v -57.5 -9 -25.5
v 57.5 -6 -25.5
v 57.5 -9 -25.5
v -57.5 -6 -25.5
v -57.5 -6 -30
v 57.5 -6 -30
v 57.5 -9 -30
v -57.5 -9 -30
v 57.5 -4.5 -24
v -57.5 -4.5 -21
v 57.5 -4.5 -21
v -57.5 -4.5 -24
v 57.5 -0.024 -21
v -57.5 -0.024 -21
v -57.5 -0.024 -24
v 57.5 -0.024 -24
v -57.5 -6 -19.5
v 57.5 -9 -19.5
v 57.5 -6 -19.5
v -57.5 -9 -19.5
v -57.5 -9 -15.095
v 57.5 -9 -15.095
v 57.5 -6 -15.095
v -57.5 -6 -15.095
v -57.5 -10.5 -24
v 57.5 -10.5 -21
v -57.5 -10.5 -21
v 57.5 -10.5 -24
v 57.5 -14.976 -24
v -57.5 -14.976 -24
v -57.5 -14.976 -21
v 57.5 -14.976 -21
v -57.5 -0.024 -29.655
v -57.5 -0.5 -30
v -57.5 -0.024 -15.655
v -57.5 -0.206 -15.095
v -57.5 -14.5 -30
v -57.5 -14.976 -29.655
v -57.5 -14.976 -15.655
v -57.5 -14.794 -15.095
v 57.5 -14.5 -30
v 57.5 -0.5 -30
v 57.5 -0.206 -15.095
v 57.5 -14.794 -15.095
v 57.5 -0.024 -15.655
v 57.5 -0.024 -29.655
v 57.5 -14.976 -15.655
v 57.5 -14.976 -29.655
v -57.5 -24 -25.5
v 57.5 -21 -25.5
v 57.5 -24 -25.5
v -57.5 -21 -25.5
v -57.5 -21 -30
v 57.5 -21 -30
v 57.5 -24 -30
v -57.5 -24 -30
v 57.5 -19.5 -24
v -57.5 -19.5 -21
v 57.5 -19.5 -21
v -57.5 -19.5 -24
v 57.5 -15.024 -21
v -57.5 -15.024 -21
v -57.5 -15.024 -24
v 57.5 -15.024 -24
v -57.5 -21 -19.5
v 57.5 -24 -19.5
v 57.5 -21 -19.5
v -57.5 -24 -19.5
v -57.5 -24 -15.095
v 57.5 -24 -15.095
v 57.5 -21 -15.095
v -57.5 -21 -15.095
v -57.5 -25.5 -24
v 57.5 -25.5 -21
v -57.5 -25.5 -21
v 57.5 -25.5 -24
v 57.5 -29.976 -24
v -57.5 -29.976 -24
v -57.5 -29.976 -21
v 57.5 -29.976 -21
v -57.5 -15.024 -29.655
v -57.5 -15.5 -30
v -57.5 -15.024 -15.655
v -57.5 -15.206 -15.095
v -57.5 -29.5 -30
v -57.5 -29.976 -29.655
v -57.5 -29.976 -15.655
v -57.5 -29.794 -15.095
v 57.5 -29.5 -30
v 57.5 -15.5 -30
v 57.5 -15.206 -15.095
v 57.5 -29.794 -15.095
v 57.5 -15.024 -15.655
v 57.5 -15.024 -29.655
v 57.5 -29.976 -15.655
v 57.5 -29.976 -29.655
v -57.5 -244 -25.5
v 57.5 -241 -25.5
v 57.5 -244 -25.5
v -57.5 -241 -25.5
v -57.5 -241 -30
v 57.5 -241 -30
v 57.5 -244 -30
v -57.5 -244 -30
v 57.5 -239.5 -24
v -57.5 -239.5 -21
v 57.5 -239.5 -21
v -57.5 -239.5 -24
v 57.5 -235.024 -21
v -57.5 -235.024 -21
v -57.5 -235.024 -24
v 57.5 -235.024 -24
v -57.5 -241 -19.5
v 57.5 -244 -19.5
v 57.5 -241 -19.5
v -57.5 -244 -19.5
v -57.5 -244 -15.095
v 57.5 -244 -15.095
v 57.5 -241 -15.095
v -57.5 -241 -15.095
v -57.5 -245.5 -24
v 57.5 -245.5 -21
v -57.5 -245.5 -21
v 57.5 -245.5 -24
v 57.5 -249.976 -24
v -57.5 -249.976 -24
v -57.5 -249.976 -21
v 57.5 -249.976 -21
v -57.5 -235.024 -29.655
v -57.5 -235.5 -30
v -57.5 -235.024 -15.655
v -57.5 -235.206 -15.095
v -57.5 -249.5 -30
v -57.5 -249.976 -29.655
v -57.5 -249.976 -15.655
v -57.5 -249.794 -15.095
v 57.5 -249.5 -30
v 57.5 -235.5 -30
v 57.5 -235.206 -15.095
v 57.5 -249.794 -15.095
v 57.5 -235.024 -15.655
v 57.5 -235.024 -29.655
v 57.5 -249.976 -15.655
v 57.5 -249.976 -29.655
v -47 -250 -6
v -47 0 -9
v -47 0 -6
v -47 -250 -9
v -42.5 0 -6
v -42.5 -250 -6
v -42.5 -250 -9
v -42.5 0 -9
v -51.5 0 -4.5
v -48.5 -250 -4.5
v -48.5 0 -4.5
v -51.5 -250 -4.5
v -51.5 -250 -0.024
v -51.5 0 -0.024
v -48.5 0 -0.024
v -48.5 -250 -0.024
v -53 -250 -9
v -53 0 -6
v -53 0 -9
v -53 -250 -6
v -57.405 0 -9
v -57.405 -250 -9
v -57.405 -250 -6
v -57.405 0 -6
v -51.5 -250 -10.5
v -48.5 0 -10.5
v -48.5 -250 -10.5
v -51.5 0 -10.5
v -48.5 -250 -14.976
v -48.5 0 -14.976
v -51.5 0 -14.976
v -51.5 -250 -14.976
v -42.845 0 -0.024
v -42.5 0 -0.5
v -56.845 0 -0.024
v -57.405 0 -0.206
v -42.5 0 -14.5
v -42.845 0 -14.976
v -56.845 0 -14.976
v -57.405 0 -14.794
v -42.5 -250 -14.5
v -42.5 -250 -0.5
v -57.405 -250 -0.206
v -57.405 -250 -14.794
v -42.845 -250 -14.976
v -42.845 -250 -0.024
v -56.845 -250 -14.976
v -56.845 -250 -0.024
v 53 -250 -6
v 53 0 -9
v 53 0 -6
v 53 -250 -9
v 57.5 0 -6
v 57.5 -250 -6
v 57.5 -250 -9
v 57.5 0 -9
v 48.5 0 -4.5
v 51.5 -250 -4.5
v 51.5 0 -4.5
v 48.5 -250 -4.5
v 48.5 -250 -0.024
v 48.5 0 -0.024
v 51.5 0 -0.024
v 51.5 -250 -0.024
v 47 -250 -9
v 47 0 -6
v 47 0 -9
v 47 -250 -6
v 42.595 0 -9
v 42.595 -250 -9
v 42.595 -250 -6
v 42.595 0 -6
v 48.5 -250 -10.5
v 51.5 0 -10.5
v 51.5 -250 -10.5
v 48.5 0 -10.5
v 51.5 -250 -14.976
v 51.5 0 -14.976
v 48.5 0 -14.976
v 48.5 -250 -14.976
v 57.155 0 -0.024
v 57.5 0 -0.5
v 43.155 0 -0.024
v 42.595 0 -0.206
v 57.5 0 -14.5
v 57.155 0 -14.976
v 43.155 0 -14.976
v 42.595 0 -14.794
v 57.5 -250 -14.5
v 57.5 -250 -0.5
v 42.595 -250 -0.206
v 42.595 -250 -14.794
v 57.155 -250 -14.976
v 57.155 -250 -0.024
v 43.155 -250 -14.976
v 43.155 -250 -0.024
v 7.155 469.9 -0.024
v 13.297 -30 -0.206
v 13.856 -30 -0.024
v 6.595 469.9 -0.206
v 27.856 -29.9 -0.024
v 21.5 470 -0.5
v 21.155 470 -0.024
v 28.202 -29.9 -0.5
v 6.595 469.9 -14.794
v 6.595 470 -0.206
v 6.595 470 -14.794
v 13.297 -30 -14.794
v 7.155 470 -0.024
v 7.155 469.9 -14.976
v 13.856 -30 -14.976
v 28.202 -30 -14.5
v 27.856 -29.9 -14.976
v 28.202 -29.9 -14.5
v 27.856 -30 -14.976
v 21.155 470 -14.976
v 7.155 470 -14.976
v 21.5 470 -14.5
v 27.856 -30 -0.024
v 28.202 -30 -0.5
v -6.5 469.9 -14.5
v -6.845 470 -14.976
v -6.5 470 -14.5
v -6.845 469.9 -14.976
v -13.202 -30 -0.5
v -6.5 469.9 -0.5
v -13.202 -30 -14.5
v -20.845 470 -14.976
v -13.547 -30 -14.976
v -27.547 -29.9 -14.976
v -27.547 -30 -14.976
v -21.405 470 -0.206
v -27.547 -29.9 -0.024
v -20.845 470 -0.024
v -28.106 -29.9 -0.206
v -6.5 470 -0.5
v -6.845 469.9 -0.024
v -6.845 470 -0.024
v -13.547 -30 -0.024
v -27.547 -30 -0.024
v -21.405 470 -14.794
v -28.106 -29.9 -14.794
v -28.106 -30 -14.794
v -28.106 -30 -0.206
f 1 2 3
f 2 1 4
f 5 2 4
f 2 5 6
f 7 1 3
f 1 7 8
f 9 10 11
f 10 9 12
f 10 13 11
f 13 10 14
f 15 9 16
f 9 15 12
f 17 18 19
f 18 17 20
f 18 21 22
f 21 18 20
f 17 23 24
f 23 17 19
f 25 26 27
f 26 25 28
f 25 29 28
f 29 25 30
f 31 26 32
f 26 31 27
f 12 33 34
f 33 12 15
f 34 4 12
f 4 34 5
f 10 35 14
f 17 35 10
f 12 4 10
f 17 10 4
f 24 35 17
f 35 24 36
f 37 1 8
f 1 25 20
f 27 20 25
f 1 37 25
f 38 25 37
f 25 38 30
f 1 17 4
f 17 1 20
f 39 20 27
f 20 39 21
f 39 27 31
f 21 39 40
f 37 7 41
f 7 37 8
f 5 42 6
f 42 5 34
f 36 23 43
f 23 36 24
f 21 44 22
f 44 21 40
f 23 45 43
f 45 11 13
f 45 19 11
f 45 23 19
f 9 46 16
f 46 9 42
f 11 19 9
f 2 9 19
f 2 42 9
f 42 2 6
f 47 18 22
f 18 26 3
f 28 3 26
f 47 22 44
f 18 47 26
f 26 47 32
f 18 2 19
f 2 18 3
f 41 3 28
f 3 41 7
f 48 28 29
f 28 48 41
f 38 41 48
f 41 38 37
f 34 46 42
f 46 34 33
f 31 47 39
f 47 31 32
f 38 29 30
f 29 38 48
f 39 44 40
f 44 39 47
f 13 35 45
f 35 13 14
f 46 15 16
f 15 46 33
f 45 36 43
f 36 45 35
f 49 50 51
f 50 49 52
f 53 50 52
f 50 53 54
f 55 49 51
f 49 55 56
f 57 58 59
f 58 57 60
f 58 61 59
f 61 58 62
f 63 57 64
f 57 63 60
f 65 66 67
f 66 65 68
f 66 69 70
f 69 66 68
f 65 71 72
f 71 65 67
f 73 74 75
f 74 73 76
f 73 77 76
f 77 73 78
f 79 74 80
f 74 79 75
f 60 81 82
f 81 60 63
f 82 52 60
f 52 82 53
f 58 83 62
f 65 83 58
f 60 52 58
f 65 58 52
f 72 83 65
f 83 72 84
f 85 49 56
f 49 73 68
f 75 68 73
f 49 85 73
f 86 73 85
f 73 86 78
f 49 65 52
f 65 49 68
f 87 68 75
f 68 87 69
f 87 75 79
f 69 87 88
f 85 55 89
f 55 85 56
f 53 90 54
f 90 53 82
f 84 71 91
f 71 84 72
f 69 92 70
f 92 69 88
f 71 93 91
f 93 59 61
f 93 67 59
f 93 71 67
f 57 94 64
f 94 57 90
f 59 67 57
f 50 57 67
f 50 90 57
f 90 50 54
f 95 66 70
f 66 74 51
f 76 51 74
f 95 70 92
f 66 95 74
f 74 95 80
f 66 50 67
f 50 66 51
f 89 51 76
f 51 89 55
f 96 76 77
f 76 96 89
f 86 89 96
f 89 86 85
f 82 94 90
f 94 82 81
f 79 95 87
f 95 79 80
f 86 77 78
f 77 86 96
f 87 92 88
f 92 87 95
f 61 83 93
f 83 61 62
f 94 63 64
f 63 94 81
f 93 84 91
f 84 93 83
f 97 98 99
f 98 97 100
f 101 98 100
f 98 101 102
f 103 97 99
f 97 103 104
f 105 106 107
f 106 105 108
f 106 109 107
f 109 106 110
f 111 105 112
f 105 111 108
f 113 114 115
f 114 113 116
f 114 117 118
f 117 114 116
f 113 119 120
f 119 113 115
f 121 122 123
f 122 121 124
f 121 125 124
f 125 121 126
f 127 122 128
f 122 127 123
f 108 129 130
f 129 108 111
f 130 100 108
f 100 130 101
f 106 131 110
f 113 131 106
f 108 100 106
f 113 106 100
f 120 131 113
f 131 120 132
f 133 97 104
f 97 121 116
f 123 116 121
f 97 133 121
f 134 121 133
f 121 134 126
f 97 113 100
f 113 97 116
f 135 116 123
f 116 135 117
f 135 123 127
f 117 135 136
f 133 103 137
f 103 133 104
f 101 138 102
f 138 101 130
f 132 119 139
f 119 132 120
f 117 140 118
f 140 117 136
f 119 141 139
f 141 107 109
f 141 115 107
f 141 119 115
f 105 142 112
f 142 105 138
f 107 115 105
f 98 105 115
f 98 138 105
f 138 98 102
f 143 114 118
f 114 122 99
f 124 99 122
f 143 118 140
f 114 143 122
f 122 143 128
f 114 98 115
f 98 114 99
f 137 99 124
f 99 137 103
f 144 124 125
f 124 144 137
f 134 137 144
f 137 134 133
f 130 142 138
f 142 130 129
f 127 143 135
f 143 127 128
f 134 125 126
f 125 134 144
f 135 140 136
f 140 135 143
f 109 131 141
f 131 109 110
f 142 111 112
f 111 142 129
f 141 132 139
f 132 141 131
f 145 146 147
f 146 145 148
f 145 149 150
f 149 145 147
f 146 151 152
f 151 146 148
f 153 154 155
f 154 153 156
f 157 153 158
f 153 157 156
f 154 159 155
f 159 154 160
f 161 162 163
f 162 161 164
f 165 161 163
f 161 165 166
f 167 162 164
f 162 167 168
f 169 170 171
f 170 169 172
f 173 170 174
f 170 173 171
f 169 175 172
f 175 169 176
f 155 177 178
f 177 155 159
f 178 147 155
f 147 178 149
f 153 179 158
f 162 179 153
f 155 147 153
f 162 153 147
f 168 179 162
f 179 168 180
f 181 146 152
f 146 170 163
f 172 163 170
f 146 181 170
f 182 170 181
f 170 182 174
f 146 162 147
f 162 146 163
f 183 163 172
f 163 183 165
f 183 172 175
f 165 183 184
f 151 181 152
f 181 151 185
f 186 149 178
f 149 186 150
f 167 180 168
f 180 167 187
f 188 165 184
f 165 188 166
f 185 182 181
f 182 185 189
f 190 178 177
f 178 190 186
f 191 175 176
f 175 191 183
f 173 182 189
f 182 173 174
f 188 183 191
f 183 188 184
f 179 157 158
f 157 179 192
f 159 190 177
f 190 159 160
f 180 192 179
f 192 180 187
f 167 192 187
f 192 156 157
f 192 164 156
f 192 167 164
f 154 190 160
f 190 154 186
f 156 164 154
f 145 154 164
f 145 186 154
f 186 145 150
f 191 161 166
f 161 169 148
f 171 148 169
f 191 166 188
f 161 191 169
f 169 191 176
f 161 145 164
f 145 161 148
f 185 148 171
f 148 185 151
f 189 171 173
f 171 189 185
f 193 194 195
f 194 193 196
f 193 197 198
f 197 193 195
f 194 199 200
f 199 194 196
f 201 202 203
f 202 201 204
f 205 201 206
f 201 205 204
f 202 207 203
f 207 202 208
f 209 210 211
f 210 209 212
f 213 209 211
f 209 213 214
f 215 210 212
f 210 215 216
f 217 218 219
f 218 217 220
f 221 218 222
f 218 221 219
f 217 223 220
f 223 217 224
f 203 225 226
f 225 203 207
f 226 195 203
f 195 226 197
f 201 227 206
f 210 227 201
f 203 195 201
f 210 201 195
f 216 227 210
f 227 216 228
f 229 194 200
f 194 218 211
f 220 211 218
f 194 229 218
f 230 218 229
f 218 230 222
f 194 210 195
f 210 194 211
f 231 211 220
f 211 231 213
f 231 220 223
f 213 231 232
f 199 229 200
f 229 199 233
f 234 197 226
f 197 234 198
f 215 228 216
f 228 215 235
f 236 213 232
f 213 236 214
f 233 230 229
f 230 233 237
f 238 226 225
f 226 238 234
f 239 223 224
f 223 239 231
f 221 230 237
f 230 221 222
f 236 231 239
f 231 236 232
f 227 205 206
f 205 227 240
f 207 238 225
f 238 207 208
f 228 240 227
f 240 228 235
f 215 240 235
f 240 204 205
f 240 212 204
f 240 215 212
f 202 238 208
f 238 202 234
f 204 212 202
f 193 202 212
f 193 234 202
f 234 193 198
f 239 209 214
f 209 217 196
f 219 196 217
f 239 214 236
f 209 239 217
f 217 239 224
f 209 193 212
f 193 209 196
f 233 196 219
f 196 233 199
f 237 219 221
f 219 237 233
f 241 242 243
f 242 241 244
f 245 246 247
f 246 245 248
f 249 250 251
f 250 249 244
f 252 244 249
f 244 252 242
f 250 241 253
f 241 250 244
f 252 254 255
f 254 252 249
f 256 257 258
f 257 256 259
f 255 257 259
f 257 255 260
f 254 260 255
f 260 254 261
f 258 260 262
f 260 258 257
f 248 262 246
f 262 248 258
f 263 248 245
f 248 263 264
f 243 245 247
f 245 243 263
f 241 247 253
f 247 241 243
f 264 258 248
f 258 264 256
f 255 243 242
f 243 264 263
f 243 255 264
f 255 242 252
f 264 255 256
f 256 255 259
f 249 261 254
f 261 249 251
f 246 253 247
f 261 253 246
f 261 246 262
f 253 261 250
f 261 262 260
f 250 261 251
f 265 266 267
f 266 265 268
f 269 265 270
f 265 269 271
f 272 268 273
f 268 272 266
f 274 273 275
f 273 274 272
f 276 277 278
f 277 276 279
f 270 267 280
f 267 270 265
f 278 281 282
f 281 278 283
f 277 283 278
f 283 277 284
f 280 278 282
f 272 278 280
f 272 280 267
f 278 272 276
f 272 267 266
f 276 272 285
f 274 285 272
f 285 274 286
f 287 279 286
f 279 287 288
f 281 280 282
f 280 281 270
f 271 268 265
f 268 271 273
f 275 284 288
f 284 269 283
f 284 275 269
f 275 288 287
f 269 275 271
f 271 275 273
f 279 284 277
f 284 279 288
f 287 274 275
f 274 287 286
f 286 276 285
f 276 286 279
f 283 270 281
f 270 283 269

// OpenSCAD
// file: screws.scad
module screwA(dia,z,hDia,hZ,rY){
    rotate([0,rY,0]){
    $fn=12;
    cylinder(d1=hDia,d2=dia,h=hZ);
    cylinder(d=dia,h=z);
    }
}
// file: parameter.scad
nStrings=6;
nFrets=24;
nLedFrets=16;
m5Dia=5.3;
m5HeadZ=3.5;
m4Dia=4.3;
m4NutDia=8.3;
m4NutZ=3.5;
m4HeadZ=2.5;
m3Dia=3.3;
m3NutDia=6.6;
m3NutZ=2.5;
m3HeadZ=2;
m3HeadDia=6;
m2Dia=2.4;
m2HeadZ=2;
strDistN=7;
strDistB=10.5;
scale=645;
neckSlotY=500;

slotXY=15;

bodySlotX=115;
bodySlotY=250;

jackYA=40;
jackYB=54;
jackZA=20;
jackZB=25;

bodyX=300;

bodyZ=40;

strDia=[1.7,1.4,1.1,0.7,0.5,0.35];

fretStrPlus=4;
fretLN=strDistN*(nStrings-1)+fretStrPlus*2;
fretLB=strDistB*(nStrings-1)+fretStrPlus*2;
strSpanB=strDistB*(nStrings-1);
strSpanN=strDistN*(nStrings-1);
fretBtmZ=1;
neckSlotX=fretLN;
neckSlotDist=neckSlotX-slotXY*2;

neck_sideT=5.5; //thicknes of the neck side locks
neck_bottomT=2.5;

neck_mntPosYA=447;
neck_mntPosYB=420;
neck_mntEndT=2.5;
neck_lastFretSpc=13;

nut_slotSink=6;

//fretY=16;
fretPcbZ=1.6;
fretDia=3.5;
fretZ=1.5;
fretOvrZ=4;
fretboardZ=fretOvrZ+fretPcbZ;



L=scale;
k=1.05946;

fretPos1=scale-(scale/pow(k,4));

function fretPos(i)=L-(L/pow(k,i));
function fretSpc(i)=(L/pow(k,i))-(L/pow(k,i+1));
function strSpc(i)=i/L*strDistB+(1-i/L)*strDistN;
function fretL(i)=(i/L*strDistB+(1-i/L)*strDistN)*(nStrings-1)+fretStrPlus*2;

echo (70-(fretL(fretPos(1))));
// file: skeleton/mkBeam.scad
module mkBeam(height){
    size=15;
    translate([0,0,-height/2])difference(){
        rcube([size,size,height],0.5);
        for(i=[0:3]){
            rotate([0,0,i*90])translate([size/2+3,0,0])cube([size,3,height*3],center=true);
        }
    }
}

//mkBeam(50);

module rcube(size,radius){
linear_extrude(height=size[2])
if(radius>0){
hull()
{
    // place 4 circles in the corners, with the given radius
    translate([(-size[0]/2)+(radius), (-size[1]/2)+(radius), 0])
    circle(r=radius);

    translate([(size[0]/2)-(radius), (-size[1]/2)+(radius), 0])
    circle(r=radius);

    translate([(-size[0]/2)+(radius), (size[1]/2)-(radius), 0])
    circle(r=radius);

    translate([(size[0]/2)-(radius), (size[1]/2)-(radius), 0])
    circle(r=radius);
}
}
if(radius==0){
translate([0,0,size[2]/2])cube(size,center=true);
}
}
// file: skeleton/slotBody.scad
include <mkBeam.scad>;
include <../parameter.scad>;
include <../screws.scad>;

//slotBody();

module slotBody(){
    hull(){
        translate([fretL(0)/2-slotXY/2,neckSlotY-0.05-slotXY*2,-slotXY/2])rotate([90,0,0])mkBeam(0.1);
        translate([fretL(neckSlotY-nut_slotSink)/2-slotXY/2,0.05-slotXY*2,-slotXY/2])rotate([90,0,0])mkBeam(0.1);
    }
    hull(){
        translate([-(fretL(0)/2-slotXY/2),neckSlotY-0.05-slotXY*2,-slotXY/2])rotate([90,0,0])mkBeam(0.1);
        translate([-(fretL(neckSlotY-nut_slotSink)/2-slotXY/2),0.05-slotXY*2,-slotXY/2])rotate([90,0,0])mkBeam(0.1);
    }
//translate([-slotXY/2-neckSlotDist/2,neckSlotY/2-slotXY*2,-slotXY/2])rotate([90,0,0])mkBeam(neckSlotY);
//translate([slotXY/2+neckSlotDist/2,neckSlotY/2-slotXY*2,-slotXY/2])rotate([90,0,0])mkBeam(neckSlotY);

translate([0,-slotXY/2,-slotXY/2-slotXY])rotate([0,90,0])mkBeam(bodySlotX);
translate([0,-slotXY/2-slotXY,-slotXY/2-slotXY])rotate([0,90,0])mkBeam(bodySlotX);

translate([0,-bodySlotY+slotXY/2,-slotXY/2-slotXY])rotate([0,90,0])mkBeam(bodySlotX);

translate([-bodySlotX/2+slotXY/2,-bodySlotY/2,-slotXY/2])rotate([90,0,0])mkBeam(bodySlotY);
translate([-(-bodySlotX/2+slotXY/2),-bodySlotY/2,-slotXY/2])rotate([90,0,0])mkBeam(bodySlotY);

}

module slotBd_spacer(){
difference(){
    x=bodySlotX-slotXY*2;
    y=fretPos(24)-fretPos(22)+neck_lastFretSpc+neck_mntEndT;//slotXY*2;//+neck_mntEndT;
    z=6.5;
    scrwD=5;
    sink=slotXY;
translate([-x/2,-y,-sink])cube([x,y,z]);
translate([-x/4,-y/2,-sink-1])cube([x/2,y,z+2]);

translate([x/2-scrwD,-slotXY/2,-sink+z+0.1])screwA(3.3,20,7,2.5,180);
translate([x/2-scrwD,-slotXY*1.5,-sink+z+0.1])screwA(3.3,20,7,2.5,180);
    
translate([-(x/2-scrwD),-slotXY/2,-sink+z+0.1])screwA(3.3,20,7,2.5,180);
translate([-(x/2-scrwD),-slotXY*1.5,-sink+z+0.1])screwA(3.3,20,7,2.5,180);

translate([0,0,-1])slotBody();

}
}
    
//slotBd_spacer();
// main file
include <skeleton/slotBody.scad>;
//include <head/head.scad>;
//include <bridge/bridge.scad>;
//include <body/body.scad>;
//include <neck/neck.scad>;
//include <parameter.scad>;
//include <neck/neck.scad>;
//include <kickup_meBow/kickup.scad>;


//color([1,0,1])fretboard(1);
//color([1,0,1])fretboard(2);
//neckBack();
//translate([0,0,-20])color([0,1,0])body();
//projection(cut = false) slotBody();
slotBody();
//slotBd_spacer();
//neck(0);
//translate([0,neckSlotY-slotXY*2-6,0])head();
//translate([0,neckSlotY-40,0])fret();

//translate([0,-170,0])hexPickup(0);
//translate([0,-(scale-neckSlotY),0])bridge(0);
//translate([0,-120,0])kickup();


//neckEnd();

echo(39);
